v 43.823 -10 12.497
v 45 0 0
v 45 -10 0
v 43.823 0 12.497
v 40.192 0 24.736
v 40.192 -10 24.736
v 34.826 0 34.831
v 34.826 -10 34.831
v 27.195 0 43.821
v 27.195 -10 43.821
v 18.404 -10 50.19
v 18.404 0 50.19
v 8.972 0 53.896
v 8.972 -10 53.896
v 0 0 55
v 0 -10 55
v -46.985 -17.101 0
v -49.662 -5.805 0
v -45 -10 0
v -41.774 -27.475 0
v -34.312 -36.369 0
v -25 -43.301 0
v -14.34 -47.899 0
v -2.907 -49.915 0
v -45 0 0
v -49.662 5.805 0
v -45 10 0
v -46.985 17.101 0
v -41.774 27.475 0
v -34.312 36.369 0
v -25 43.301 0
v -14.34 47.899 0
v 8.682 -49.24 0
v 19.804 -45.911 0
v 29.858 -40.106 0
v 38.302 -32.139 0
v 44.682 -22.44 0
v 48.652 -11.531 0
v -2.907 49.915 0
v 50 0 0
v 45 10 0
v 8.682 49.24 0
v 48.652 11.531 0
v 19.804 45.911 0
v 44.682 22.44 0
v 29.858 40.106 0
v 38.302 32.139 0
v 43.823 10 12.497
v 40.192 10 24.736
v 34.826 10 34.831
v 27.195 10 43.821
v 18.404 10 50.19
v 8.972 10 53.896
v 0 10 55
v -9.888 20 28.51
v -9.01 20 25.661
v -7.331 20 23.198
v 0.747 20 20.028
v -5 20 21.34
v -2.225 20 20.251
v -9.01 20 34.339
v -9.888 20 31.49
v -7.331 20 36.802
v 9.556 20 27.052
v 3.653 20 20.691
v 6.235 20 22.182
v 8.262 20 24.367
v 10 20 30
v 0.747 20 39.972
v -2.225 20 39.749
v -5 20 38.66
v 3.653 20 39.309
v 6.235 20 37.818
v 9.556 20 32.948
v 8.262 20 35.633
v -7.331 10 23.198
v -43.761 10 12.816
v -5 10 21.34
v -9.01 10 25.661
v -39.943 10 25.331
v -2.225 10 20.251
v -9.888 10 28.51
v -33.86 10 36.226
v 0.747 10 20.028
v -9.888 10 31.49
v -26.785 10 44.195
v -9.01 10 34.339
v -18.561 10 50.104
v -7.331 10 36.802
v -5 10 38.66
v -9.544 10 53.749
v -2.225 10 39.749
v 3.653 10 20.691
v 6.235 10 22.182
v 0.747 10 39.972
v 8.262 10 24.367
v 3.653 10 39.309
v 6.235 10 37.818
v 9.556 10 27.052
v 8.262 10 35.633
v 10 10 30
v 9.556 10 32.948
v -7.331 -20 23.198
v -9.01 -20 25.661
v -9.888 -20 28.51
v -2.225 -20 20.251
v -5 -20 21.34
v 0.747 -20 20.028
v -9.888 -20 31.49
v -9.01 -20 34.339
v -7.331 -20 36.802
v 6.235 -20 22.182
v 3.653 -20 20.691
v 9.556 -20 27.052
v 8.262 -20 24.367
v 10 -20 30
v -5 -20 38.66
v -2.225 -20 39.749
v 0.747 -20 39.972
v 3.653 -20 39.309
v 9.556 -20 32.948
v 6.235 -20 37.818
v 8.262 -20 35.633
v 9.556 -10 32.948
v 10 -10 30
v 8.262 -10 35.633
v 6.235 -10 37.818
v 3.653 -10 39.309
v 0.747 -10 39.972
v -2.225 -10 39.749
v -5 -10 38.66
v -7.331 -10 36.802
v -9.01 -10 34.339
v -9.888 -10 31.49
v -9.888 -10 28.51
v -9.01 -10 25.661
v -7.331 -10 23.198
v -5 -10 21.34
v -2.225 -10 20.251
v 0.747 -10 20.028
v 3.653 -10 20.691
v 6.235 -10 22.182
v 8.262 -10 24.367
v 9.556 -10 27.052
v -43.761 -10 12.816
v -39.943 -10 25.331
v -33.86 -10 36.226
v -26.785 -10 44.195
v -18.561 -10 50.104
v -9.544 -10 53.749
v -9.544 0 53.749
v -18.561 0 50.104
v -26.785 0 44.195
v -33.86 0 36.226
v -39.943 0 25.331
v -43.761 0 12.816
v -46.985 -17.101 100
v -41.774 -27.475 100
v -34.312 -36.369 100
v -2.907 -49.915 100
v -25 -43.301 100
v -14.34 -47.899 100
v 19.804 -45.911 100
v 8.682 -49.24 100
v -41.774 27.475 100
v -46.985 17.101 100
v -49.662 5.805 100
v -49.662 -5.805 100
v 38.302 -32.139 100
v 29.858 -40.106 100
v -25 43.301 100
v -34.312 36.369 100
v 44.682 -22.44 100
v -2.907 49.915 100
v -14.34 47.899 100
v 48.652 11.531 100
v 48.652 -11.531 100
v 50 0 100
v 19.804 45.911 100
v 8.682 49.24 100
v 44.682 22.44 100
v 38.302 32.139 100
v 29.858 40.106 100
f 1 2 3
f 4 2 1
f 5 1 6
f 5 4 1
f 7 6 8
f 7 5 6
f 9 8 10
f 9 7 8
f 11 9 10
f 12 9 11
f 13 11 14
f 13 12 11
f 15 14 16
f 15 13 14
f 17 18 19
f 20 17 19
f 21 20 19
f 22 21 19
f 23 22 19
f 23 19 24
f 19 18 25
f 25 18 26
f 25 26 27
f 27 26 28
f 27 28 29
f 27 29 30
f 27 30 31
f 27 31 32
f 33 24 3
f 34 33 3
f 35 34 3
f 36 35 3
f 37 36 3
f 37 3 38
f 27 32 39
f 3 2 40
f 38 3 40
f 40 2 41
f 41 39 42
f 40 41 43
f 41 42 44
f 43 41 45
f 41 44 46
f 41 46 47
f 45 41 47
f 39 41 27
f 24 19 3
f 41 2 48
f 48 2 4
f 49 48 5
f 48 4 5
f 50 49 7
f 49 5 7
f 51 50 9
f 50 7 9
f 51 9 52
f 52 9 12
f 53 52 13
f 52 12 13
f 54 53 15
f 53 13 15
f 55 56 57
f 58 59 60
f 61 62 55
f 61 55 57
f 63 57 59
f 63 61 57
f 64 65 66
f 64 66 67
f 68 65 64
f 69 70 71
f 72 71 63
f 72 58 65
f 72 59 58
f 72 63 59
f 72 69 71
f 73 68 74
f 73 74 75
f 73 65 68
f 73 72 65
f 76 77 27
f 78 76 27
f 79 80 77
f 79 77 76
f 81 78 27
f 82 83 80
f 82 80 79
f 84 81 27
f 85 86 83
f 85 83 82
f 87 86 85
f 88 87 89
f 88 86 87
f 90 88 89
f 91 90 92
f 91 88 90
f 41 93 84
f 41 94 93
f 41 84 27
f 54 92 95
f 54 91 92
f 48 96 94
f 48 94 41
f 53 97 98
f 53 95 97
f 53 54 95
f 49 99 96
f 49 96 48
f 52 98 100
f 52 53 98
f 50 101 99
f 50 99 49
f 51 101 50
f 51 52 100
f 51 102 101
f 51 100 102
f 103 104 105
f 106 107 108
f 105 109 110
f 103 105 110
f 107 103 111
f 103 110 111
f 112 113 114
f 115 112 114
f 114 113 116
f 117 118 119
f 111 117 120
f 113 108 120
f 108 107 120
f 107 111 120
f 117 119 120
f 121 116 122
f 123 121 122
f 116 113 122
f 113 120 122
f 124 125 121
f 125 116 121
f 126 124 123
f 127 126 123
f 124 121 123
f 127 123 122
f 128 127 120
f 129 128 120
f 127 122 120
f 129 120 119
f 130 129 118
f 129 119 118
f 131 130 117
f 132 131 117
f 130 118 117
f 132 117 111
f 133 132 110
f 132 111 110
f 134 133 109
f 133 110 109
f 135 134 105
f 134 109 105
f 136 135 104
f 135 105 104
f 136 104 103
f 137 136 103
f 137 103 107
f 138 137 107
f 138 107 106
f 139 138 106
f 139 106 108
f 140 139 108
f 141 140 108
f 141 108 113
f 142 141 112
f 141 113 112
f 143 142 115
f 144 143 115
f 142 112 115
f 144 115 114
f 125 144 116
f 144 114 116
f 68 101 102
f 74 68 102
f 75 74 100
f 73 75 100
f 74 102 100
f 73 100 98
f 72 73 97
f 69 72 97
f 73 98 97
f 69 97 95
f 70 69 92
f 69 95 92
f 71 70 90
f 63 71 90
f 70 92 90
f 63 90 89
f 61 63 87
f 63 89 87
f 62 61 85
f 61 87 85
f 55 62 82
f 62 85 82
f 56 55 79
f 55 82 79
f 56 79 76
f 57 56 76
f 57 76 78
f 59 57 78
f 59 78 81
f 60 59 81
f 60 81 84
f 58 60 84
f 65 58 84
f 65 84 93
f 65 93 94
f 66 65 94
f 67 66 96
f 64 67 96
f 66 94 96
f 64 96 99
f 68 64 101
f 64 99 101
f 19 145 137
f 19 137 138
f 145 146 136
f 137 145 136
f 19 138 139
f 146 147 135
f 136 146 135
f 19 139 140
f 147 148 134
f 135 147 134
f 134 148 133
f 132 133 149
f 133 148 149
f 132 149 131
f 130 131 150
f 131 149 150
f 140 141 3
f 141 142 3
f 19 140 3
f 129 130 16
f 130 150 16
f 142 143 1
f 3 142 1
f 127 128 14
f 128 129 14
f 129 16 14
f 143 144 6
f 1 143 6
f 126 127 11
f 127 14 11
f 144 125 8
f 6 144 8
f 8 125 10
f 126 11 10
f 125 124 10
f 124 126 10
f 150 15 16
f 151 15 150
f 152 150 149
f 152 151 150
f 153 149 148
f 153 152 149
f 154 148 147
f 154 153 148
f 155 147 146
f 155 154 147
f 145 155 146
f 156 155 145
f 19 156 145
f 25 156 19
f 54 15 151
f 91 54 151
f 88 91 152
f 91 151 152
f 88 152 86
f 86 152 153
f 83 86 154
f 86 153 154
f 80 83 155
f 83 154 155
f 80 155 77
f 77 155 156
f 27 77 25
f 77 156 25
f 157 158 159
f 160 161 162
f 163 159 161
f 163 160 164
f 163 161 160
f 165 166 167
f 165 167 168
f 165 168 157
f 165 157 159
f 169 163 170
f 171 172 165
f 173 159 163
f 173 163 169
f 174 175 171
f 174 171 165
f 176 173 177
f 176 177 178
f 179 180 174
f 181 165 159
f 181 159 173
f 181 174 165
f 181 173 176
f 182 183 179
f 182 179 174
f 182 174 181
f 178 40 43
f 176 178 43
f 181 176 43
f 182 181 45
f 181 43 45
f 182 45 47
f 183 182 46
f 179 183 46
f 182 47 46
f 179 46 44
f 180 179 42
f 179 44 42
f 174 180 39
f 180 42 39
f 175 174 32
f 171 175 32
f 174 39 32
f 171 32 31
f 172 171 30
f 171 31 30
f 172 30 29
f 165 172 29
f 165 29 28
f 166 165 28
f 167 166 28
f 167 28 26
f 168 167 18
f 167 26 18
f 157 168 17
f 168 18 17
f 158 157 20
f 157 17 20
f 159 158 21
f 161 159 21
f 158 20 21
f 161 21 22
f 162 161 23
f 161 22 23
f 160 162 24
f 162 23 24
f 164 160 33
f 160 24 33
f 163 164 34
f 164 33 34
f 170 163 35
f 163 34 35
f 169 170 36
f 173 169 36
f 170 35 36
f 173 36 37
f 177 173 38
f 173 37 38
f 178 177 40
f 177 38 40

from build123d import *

# Parameters (mm, degrees)
F0_R     = 50
F1_DEPTH = 100
F3_DEPTH = 10
F4_R     = 10
F5_DEPTH = 20


with BuildPart() as f1:
    # F0 (on Top) → F1 (new body)
    with BuildSketch(Plane.XY):
        Circle(F0_R)
    extrude(amount=F1_DEPTH)

    # F2 (on Front) → F3 (cut, symmetric)
    with BuildSketch(Plane.XZ):
        with BuildLine():
            add(Edge.make_bspline(
                [(0, 55), (-77.9422863406, 55), (-38.9711431703, -27.5), (0, -110), (38.9711431703, -27.5), (77.9422863406, 55), (0, 55)],
                knots=[0, 0, 0, 2.0943951024, 2.0943951024, 4.1887902048, 4.1887902048, 6.2831853072, 6.2831853072, 6.2831853072], degree=2, weights=[1, 0.5, 1, 0.5, 1, 0.5, 1]))
        make_face()
    extrude(amount=F3_DEPTH, both=True, mode=Mode.SUBTRACT)

    # F4 (on Front) → F5 (cut, symmetric)
    with BuildSketch(Plane.XZ):
        with Locations((0, 30)):
            Circle(F4_R)
    extrude(amount=F5_DEPTH, both=True, mode=Mode.SUBTRACT)


solid = f1.part
